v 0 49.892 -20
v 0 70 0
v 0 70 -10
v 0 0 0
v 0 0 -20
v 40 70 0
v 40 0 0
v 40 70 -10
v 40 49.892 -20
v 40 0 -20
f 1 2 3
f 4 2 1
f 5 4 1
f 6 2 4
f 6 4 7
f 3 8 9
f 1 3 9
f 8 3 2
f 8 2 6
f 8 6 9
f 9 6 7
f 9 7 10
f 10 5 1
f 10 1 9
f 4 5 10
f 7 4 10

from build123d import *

# Parameters (mm, degrees)
SKETCH1_W           = 40
SKETCH1_H           = 20
BOSS_EXTRUDE1_DEPTH = 70
CUT_EXTRUDE1_DEPTH  = 40


with BuildPart() as part:
    # Sketch1 → Boss-Extrude1 (new body)
    with BuildSketch(Plane(origin=(0, 0, 0), x_dir=(1, 0, 0), z_dir=(0, 1, 0))):
        with Locations((20, 10)):
            Rectangle(SKETCH1_W, SKETCH1_H)
    extrude(amount=BOSS_EXTRUDE1_DEPTH)

    # Sketch2 → Cut-Extrude1 (cut)
    with BuildSketch(Plane(origin=(0, 0, 0), x_dir=(0, 0, -1), z_dir=(1, 0, 0))):
        Polygon((10, 70), (20, 49.892008703), (27.740621585, 66.282102968), (20, 74.973147169), align=None)
    extrude(amount=CUT_EXTRUDE1_DEPTH, mode=Mode.SUBTRACT)


solid = part.part
